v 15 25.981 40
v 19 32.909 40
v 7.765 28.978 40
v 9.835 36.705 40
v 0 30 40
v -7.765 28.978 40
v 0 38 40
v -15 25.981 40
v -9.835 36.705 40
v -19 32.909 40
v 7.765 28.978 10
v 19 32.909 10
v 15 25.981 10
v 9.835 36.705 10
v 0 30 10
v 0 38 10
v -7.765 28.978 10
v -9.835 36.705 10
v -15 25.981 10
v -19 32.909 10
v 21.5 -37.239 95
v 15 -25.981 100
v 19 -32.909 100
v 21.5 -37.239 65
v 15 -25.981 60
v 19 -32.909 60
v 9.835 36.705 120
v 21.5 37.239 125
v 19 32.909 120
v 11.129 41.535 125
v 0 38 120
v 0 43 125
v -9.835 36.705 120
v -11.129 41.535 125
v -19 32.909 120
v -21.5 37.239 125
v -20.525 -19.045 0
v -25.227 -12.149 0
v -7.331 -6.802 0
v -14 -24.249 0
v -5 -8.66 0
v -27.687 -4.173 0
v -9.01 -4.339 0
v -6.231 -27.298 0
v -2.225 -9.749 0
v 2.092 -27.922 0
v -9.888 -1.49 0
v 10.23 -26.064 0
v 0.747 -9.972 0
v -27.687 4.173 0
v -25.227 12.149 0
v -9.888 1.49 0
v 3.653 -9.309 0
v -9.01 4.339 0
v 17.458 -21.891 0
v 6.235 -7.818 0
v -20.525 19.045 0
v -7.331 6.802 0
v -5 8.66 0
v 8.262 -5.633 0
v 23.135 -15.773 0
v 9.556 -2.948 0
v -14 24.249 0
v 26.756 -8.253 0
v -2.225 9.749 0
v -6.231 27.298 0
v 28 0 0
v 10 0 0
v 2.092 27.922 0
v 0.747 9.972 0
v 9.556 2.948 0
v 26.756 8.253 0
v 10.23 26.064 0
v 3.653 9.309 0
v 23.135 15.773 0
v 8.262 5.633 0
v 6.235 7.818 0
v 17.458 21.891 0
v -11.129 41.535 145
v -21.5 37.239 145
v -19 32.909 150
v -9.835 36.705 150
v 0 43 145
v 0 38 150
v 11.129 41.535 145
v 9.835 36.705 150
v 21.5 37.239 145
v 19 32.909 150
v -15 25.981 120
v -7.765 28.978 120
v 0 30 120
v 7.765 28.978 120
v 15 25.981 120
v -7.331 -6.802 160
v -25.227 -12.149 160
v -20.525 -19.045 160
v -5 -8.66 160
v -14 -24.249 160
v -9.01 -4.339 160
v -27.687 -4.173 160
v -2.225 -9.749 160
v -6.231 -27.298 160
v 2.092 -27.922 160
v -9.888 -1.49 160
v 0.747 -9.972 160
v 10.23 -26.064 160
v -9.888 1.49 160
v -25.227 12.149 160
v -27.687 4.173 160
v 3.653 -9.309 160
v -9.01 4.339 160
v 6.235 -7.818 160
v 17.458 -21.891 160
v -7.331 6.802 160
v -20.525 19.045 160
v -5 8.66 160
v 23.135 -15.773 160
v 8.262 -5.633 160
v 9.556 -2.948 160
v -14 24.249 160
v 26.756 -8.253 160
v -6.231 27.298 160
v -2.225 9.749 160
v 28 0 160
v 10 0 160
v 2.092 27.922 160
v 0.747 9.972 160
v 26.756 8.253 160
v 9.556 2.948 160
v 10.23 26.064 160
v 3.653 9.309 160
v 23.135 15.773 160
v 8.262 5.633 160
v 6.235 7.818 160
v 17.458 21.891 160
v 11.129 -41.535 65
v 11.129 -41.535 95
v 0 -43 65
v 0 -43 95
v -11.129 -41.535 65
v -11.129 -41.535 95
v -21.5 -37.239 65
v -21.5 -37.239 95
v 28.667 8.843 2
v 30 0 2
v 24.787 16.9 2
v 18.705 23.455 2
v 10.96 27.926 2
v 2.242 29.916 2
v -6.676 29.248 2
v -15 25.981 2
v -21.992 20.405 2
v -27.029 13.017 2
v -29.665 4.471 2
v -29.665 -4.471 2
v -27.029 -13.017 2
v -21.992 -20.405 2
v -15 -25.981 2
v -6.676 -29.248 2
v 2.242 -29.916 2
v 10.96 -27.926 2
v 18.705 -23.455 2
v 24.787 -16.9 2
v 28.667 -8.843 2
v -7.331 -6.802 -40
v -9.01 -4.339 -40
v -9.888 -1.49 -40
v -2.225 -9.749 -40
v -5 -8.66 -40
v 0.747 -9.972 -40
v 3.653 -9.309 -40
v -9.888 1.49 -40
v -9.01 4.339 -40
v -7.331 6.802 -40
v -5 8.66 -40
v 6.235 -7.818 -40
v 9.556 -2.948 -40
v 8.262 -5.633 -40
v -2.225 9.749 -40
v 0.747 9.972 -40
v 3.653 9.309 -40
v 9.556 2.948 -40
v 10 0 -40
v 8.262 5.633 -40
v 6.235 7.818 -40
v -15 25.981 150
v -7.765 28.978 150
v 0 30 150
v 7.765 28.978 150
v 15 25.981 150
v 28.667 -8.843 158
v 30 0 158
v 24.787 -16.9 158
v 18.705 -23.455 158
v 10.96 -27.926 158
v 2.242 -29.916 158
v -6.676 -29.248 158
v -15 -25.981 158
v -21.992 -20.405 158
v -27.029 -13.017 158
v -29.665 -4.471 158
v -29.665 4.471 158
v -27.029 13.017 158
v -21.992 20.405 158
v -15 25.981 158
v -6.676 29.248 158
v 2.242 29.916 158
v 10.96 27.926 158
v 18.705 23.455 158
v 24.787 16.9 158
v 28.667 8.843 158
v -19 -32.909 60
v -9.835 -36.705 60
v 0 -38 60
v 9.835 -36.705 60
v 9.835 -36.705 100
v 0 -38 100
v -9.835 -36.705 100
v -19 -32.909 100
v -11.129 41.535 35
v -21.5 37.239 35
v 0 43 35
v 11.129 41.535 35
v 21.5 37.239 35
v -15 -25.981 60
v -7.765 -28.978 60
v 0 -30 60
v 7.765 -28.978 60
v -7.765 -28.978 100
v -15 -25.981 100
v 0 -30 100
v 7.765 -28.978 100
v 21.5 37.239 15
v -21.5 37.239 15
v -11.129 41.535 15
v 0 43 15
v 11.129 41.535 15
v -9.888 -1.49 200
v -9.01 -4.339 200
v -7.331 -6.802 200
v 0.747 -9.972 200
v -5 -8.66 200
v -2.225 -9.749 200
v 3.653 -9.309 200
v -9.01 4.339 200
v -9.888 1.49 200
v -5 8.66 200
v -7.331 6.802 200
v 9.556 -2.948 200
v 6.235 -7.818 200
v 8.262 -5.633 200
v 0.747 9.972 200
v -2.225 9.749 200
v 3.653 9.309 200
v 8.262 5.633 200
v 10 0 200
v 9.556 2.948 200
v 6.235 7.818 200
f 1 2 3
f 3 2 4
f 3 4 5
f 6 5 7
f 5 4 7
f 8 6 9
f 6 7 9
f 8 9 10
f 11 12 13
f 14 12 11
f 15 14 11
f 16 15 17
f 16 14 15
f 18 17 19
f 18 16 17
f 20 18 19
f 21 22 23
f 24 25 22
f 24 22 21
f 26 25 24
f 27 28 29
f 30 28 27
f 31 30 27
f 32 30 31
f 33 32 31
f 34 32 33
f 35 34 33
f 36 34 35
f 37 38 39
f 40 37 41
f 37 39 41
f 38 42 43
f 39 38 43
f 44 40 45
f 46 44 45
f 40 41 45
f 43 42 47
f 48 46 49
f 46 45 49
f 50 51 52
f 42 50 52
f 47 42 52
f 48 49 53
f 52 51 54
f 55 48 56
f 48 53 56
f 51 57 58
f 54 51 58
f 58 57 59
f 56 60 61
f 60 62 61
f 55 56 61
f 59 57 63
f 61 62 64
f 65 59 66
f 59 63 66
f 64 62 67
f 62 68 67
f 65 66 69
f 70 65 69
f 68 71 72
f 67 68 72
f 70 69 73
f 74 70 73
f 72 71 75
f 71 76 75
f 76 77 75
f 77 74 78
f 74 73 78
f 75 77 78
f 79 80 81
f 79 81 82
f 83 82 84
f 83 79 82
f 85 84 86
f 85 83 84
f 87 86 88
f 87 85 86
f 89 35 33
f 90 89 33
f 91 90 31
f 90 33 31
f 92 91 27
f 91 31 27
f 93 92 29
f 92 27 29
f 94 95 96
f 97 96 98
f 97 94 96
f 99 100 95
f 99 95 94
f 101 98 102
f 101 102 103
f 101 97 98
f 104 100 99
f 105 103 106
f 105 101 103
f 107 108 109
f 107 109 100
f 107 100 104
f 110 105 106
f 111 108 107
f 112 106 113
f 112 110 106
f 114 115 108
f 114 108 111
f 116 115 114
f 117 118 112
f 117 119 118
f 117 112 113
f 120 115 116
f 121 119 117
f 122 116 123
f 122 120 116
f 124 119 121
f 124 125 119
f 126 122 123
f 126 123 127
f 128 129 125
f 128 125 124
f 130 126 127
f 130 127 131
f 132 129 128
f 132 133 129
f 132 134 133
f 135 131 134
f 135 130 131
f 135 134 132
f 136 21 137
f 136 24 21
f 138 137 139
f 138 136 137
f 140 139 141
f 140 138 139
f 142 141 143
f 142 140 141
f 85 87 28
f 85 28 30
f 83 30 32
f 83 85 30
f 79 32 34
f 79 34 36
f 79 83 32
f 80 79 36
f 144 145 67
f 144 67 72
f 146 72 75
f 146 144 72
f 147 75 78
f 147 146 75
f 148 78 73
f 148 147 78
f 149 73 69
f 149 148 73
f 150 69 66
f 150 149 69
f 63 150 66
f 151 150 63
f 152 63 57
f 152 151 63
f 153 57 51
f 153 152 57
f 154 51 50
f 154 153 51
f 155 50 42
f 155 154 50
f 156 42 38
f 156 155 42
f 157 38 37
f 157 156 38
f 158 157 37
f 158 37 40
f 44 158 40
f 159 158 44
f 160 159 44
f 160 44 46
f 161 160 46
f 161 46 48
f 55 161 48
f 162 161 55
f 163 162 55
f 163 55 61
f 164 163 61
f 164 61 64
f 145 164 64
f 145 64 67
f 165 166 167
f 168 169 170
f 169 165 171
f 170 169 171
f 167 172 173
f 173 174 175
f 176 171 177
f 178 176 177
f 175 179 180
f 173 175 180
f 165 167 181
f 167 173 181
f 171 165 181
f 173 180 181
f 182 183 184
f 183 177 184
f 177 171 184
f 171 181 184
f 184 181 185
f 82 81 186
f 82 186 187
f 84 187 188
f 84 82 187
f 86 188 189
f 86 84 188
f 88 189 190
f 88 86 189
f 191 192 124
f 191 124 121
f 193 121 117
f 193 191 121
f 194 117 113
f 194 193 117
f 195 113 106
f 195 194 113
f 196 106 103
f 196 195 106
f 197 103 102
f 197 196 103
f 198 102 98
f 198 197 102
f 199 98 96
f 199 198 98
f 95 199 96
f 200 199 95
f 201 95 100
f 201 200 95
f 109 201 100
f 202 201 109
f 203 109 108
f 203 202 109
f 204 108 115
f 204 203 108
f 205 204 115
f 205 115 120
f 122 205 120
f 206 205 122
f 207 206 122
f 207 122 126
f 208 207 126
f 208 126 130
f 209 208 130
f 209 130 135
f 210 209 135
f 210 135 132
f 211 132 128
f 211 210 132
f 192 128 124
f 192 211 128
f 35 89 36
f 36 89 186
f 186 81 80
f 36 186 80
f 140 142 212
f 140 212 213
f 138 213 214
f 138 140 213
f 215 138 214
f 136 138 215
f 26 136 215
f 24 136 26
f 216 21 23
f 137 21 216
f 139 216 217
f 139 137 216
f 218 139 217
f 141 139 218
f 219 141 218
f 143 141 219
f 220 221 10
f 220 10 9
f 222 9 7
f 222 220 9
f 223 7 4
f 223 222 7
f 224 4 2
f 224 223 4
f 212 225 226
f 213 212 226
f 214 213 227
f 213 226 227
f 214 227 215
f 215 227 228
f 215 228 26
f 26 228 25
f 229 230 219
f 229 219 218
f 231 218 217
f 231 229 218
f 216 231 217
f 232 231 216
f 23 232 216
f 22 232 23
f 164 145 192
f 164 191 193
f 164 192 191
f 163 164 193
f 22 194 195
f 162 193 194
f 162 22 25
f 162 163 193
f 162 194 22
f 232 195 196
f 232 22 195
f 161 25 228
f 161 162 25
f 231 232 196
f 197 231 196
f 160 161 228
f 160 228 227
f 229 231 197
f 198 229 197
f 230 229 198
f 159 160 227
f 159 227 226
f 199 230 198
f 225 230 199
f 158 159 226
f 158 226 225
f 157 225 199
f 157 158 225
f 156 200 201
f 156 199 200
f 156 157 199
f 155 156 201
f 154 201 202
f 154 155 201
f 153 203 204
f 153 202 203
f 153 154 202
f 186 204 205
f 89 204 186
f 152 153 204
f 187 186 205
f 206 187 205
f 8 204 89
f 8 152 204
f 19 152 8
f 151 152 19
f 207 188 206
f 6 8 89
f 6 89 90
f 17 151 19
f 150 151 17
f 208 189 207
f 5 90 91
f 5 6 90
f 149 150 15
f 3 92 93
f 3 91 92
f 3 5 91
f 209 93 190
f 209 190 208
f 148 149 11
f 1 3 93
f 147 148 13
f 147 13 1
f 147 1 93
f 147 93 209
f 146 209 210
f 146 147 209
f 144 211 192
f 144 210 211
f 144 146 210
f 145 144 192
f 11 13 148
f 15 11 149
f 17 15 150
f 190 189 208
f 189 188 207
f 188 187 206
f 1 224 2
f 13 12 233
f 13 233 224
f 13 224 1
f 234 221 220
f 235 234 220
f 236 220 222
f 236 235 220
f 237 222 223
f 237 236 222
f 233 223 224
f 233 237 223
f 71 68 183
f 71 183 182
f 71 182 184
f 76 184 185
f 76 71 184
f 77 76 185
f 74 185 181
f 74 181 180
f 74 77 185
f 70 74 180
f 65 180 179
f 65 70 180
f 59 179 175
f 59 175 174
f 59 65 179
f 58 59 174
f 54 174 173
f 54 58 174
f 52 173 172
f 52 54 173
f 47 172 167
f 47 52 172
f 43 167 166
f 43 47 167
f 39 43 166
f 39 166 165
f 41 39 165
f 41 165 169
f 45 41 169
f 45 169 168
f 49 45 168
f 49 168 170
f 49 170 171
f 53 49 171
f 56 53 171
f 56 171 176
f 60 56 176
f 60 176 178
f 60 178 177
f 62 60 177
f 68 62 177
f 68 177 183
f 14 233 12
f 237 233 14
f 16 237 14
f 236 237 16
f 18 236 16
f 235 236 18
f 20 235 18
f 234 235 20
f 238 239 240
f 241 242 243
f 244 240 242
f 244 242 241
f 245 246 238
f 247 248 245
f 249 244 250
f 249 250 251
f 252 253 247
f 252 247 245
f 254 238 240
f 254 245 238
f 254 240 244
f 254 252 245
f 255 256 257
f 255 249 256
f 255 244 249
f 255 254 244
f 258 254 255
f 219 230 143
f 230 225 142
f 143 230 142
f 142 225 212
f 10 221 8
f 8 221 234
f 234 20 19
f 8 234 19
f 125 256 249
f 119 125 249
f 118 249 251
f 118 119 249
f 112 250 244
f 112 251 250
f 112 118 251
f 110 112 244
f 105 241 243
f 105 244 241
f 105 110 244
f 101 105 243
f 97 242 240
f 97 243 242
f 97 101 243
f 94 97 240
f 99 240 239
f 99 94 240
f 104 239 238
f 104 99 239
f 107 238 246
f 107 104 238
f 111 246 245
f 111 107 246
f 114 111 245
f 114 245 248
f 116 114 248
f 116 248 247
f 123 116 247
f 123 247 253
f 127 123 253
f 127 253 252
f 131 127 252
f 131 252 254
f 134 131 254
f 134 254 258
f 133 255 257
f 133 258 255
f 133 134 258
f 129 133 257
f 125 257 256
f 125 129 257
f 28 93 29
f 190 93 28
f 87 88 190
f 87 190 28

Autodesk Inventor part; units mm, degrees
ref_plane "YZ Plane" through (0, 0, 0) normal (1, 0, 0) x (0, 1, 0)
sketch "Sketch1" plane through (0, 0, 0) normal (0, 0, 1) x (1, 0, 0)
  circle A0 centre (0, 0) radius 30
  dimension "d0" = 60
extrude "Extrusion1" add sketch "Sketch1" along normal blind 160
ref_plane "Work Plane1" through (0, 0, 150) normal (0, 0, 1) x (1, 0, 0)
sketch "Sketch4" plane through (0, 0, 150) normal (0, 0, 1) x (1, 0, 0)
  circle A0 centre (0, 0) radius 30 projected
  line L0 (0, 0) -> (21.5, 37.2391)
  line L1 (0, 0) -> (43, 0) construction
  line L2 (0, 0) -> (-25, 43.3013)
  arc A1 (21.5, 37.2391) -> (-21.5, 37.2391) centre (0, 0) ccw
  point P0 (-21.5, 37.2391)
  point P1 (-15, 25.9808)
  point P2 (15, 25.9808)
  dimension "d6" = 43
  dimension "d7" = 60
extrude "Extrusion2" add sketch "Sketch4" against normal blind 30 contours A0 L2 A1 L0
ref_plane "Work Plane2" through (0, 0, 80) normal (0, 0, 1) x (1, 0, 0)
mirror "Mirror1" about plane through (0, 0, 80) normal (0, 0, 1) of "Extrusion2"
sketch "Sketch5" plane through (0, 0, 80) normal (0, 0, 1) x (1, 0, 0)
  line L0 (0, 0) -> (21.5, -37.2391)
  line L1 (0, 0) -> (43, 0) construction
  circle A0 centre (0, 0) radius 30 projected
  line L2 (0, 0) -> (-21.5, -37.2391)
  arc A1 (-21.5, -37.2391) -> (21.5, -37.2391) centre (0, 0) ccw
  point P0 (15, -25.9808)
  point P1 (-15, -25.9808)
  dimension "d10" = 43
  dimension "d11" = 60
extrude "Extrusion3" add sketch "Sketch5" along normal mid plane 40 contours L0 A1 L2 A0
chamfer "Chamfer1" distance 5 angle 45 6 edges at (0, 43, 150) (0, 43, 120) (0, 43, 40) (0, 43, 10) (0, -43, 100) (0, -43, 60)
chamfer "Chamfer2" distance 2 angle 45 2 edges at (-30, 0, 0) (-30, 0, 160)
sketch "Sketch6" plane through (0, 0, 160) normal (0, 0, 1) x (1, 0, 0)
  circle A0 centre (0, 0) radius 10
  dimension "d20" = 20
extrude "Extrusion4" add sketch "Sketch6" along normal blind 40 and the other way blind 200
